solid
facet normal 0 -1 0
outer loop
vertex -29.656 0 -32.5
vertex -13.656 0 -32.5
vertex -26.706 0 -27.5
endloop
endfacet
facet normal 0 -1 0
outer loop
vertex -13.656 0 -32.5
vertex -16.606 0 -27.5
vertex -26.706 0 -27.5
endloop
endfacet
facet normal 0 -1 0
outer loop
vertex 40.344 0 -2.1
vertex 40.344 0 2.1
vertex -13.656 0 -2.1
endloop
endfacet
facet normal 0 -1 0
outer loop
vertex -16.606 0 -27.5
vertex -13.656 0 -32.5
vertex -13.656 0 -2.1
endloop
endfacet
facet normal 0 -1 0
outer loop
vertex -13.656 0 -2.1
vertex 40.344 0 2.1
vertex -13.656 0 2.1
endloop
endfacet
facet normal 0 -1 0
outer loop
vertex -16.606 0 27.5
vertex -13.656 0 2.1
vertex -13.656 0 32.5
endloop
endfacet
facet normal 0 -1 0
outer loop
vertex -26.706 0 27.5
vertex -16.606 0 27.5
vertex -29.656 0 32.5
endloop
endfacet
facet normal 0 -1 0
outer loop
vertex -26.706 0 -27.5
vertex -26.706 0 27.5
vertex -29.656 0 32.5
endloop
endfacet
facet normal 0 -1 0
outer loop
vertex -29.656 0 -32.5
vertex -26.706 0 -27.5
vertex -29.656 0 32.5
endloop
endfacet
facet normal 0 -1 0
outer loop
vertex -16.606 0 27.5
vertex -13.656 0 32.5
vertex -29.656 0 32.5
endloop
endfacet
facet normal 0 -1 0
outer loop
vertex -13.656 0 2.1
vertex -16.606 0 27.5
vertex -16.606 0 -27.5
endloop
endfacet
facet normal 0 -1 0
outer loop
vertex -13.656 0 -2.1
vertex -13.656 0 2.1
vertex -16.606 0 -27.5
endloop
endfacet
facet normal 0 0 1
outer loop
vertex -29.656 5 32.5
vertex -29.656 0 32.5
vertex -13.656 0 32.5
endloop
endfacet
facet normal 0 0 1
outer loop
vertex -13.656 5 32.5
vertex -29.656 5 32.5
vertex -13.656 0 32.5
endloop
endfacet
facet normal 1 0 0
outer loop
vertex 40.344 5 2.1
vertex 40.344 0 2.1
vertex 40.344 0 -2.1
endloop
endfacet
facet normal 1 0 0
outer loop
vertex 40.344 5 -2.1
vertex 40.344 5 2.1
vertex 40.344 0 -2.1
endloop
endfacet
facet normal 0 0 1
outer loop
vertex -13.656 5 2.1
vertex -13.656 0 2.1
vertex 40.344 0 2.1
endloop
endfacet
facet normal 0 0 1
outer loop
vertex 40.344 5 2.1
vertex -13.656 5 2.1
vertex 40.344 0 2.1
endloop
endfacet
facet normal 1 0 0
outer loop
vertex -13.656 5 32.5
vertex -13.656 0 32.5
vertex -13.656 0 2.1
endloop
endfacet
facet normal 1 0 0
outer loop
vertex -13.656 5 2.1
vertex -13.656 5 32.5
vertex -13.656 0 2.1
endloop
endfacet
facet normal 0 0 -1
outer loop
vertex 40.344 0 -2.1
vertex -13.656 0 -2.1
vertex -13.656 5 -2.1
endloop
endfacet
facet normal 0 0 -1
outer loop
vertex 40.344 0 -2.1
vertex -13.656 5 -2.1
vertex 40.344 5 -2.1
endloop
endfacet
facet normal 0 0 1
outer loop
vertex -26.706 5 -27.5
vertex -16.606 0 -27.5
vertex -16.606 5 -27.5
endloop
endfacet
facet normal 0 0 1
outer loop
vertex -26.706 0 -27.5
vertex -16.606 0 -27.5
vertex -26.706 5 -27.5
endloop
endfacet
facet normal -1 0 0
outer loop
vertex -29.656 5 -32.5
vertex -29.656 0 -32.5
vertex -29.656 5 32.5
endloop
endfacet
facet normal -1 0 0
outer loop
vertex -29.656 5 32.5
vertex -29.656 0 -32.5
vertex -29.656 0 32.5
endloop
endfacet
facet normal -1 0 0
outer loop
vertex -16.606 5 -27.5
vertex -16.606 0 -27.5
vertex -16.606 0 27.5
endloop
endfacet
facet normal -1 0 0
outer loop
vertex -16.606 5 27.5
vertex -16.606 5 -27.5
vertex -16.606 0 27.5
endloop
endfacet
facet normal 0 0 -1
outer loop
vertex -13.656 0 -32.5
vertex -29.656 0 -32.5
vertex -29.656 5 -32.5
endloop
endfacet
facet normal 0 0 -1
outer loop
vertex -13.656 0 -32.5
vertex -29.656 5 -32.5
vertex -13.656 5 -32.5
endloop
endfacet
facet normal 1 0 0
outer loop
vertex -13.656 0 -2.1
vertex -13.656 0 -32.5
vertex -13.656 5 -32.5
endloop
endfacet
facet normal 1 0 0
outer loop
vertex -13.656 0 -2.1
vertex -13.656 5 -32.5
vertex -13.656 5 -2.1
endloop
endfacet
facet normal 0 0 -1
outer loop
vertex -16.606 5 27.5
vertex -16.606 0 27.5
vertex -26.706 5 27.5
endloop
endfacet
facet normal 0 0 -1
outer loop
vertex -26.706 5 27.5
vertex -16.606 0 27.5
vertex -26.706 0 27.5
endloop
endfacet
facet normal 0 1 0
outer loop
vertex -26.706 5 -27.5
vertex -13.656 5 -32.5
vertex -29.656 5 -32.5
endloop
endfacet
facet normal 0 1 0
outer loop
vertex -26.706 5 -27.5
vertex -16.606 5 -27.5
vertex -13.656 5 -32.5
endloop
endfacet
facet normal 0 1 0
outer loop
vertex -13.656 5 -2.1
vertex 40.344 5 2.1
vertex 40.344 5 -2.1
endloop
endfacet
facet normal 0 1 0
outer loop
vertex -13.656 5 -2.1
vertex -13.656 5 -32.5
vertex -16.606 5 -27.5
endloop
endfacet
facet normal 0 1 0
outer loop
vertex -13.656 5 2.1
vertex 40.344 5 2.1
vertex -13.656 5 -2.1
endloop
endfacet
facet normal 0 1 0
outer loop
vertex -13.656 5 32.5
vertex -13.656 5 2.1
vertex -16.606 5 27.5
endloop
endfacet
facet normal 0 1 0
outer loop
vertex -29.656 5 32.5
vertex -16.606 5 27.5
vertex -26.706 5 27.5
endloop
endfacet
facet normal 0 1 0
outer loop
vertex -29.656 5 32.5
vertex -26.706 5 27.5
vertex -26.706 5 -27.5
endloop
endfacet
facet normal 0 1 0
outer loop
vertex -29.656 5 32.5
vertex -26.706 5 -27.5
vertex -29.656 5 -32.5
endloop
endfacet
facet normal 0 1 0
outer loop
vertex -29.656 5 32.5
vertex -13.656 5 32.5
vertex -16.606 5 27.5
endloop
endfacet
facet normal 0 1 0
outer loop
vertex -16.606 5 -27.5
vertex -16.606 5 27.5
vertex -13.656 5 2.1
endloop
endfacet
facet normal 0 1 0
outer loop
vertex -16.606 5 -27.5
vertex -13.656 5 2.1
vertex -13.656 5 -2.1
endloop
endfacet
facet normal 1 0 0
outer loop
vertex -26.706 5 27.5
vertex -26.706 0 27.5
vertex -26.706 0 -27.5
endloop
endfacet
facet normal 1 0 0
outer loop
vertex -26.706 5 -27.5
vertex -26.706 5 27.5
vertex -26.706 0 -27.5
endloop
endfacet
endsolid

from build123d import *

# Parameters (mm, degrees)
EXTRUDE_1_DEPTH = 5


with BuildPart() as part:
    # 草圖1 → 填料-伸長1 (new body)
    with BuildSketch(Plane(origin=(0, 0, 0), x_dir=(1, 0, 0), z_dir=(0, 1, 0))):
        Polygon((-29.65648855, 0), (-29.65648855, 32.5), (-13.65648855, 32.5), (-13.65648855, 2.1), (40.34351145, 2.1), (40.34351145, 0), (-16.60648855, 0), (-16.60648855, 27.5), (-26.70648855, 27.5), (-26.70648855, 0), align=None)
    extrude_1 = extrude(amount=EXTRUDE_1_DEPTH)

    # 鏡射1: 填料-伸長1 across plane
    add(extrude_1.mirror(Plane(origin=(-16.60648855, 5, 0), x_dir=(1, 0, 0), z_dir=(0, 0, -1))))


solid = part.part
